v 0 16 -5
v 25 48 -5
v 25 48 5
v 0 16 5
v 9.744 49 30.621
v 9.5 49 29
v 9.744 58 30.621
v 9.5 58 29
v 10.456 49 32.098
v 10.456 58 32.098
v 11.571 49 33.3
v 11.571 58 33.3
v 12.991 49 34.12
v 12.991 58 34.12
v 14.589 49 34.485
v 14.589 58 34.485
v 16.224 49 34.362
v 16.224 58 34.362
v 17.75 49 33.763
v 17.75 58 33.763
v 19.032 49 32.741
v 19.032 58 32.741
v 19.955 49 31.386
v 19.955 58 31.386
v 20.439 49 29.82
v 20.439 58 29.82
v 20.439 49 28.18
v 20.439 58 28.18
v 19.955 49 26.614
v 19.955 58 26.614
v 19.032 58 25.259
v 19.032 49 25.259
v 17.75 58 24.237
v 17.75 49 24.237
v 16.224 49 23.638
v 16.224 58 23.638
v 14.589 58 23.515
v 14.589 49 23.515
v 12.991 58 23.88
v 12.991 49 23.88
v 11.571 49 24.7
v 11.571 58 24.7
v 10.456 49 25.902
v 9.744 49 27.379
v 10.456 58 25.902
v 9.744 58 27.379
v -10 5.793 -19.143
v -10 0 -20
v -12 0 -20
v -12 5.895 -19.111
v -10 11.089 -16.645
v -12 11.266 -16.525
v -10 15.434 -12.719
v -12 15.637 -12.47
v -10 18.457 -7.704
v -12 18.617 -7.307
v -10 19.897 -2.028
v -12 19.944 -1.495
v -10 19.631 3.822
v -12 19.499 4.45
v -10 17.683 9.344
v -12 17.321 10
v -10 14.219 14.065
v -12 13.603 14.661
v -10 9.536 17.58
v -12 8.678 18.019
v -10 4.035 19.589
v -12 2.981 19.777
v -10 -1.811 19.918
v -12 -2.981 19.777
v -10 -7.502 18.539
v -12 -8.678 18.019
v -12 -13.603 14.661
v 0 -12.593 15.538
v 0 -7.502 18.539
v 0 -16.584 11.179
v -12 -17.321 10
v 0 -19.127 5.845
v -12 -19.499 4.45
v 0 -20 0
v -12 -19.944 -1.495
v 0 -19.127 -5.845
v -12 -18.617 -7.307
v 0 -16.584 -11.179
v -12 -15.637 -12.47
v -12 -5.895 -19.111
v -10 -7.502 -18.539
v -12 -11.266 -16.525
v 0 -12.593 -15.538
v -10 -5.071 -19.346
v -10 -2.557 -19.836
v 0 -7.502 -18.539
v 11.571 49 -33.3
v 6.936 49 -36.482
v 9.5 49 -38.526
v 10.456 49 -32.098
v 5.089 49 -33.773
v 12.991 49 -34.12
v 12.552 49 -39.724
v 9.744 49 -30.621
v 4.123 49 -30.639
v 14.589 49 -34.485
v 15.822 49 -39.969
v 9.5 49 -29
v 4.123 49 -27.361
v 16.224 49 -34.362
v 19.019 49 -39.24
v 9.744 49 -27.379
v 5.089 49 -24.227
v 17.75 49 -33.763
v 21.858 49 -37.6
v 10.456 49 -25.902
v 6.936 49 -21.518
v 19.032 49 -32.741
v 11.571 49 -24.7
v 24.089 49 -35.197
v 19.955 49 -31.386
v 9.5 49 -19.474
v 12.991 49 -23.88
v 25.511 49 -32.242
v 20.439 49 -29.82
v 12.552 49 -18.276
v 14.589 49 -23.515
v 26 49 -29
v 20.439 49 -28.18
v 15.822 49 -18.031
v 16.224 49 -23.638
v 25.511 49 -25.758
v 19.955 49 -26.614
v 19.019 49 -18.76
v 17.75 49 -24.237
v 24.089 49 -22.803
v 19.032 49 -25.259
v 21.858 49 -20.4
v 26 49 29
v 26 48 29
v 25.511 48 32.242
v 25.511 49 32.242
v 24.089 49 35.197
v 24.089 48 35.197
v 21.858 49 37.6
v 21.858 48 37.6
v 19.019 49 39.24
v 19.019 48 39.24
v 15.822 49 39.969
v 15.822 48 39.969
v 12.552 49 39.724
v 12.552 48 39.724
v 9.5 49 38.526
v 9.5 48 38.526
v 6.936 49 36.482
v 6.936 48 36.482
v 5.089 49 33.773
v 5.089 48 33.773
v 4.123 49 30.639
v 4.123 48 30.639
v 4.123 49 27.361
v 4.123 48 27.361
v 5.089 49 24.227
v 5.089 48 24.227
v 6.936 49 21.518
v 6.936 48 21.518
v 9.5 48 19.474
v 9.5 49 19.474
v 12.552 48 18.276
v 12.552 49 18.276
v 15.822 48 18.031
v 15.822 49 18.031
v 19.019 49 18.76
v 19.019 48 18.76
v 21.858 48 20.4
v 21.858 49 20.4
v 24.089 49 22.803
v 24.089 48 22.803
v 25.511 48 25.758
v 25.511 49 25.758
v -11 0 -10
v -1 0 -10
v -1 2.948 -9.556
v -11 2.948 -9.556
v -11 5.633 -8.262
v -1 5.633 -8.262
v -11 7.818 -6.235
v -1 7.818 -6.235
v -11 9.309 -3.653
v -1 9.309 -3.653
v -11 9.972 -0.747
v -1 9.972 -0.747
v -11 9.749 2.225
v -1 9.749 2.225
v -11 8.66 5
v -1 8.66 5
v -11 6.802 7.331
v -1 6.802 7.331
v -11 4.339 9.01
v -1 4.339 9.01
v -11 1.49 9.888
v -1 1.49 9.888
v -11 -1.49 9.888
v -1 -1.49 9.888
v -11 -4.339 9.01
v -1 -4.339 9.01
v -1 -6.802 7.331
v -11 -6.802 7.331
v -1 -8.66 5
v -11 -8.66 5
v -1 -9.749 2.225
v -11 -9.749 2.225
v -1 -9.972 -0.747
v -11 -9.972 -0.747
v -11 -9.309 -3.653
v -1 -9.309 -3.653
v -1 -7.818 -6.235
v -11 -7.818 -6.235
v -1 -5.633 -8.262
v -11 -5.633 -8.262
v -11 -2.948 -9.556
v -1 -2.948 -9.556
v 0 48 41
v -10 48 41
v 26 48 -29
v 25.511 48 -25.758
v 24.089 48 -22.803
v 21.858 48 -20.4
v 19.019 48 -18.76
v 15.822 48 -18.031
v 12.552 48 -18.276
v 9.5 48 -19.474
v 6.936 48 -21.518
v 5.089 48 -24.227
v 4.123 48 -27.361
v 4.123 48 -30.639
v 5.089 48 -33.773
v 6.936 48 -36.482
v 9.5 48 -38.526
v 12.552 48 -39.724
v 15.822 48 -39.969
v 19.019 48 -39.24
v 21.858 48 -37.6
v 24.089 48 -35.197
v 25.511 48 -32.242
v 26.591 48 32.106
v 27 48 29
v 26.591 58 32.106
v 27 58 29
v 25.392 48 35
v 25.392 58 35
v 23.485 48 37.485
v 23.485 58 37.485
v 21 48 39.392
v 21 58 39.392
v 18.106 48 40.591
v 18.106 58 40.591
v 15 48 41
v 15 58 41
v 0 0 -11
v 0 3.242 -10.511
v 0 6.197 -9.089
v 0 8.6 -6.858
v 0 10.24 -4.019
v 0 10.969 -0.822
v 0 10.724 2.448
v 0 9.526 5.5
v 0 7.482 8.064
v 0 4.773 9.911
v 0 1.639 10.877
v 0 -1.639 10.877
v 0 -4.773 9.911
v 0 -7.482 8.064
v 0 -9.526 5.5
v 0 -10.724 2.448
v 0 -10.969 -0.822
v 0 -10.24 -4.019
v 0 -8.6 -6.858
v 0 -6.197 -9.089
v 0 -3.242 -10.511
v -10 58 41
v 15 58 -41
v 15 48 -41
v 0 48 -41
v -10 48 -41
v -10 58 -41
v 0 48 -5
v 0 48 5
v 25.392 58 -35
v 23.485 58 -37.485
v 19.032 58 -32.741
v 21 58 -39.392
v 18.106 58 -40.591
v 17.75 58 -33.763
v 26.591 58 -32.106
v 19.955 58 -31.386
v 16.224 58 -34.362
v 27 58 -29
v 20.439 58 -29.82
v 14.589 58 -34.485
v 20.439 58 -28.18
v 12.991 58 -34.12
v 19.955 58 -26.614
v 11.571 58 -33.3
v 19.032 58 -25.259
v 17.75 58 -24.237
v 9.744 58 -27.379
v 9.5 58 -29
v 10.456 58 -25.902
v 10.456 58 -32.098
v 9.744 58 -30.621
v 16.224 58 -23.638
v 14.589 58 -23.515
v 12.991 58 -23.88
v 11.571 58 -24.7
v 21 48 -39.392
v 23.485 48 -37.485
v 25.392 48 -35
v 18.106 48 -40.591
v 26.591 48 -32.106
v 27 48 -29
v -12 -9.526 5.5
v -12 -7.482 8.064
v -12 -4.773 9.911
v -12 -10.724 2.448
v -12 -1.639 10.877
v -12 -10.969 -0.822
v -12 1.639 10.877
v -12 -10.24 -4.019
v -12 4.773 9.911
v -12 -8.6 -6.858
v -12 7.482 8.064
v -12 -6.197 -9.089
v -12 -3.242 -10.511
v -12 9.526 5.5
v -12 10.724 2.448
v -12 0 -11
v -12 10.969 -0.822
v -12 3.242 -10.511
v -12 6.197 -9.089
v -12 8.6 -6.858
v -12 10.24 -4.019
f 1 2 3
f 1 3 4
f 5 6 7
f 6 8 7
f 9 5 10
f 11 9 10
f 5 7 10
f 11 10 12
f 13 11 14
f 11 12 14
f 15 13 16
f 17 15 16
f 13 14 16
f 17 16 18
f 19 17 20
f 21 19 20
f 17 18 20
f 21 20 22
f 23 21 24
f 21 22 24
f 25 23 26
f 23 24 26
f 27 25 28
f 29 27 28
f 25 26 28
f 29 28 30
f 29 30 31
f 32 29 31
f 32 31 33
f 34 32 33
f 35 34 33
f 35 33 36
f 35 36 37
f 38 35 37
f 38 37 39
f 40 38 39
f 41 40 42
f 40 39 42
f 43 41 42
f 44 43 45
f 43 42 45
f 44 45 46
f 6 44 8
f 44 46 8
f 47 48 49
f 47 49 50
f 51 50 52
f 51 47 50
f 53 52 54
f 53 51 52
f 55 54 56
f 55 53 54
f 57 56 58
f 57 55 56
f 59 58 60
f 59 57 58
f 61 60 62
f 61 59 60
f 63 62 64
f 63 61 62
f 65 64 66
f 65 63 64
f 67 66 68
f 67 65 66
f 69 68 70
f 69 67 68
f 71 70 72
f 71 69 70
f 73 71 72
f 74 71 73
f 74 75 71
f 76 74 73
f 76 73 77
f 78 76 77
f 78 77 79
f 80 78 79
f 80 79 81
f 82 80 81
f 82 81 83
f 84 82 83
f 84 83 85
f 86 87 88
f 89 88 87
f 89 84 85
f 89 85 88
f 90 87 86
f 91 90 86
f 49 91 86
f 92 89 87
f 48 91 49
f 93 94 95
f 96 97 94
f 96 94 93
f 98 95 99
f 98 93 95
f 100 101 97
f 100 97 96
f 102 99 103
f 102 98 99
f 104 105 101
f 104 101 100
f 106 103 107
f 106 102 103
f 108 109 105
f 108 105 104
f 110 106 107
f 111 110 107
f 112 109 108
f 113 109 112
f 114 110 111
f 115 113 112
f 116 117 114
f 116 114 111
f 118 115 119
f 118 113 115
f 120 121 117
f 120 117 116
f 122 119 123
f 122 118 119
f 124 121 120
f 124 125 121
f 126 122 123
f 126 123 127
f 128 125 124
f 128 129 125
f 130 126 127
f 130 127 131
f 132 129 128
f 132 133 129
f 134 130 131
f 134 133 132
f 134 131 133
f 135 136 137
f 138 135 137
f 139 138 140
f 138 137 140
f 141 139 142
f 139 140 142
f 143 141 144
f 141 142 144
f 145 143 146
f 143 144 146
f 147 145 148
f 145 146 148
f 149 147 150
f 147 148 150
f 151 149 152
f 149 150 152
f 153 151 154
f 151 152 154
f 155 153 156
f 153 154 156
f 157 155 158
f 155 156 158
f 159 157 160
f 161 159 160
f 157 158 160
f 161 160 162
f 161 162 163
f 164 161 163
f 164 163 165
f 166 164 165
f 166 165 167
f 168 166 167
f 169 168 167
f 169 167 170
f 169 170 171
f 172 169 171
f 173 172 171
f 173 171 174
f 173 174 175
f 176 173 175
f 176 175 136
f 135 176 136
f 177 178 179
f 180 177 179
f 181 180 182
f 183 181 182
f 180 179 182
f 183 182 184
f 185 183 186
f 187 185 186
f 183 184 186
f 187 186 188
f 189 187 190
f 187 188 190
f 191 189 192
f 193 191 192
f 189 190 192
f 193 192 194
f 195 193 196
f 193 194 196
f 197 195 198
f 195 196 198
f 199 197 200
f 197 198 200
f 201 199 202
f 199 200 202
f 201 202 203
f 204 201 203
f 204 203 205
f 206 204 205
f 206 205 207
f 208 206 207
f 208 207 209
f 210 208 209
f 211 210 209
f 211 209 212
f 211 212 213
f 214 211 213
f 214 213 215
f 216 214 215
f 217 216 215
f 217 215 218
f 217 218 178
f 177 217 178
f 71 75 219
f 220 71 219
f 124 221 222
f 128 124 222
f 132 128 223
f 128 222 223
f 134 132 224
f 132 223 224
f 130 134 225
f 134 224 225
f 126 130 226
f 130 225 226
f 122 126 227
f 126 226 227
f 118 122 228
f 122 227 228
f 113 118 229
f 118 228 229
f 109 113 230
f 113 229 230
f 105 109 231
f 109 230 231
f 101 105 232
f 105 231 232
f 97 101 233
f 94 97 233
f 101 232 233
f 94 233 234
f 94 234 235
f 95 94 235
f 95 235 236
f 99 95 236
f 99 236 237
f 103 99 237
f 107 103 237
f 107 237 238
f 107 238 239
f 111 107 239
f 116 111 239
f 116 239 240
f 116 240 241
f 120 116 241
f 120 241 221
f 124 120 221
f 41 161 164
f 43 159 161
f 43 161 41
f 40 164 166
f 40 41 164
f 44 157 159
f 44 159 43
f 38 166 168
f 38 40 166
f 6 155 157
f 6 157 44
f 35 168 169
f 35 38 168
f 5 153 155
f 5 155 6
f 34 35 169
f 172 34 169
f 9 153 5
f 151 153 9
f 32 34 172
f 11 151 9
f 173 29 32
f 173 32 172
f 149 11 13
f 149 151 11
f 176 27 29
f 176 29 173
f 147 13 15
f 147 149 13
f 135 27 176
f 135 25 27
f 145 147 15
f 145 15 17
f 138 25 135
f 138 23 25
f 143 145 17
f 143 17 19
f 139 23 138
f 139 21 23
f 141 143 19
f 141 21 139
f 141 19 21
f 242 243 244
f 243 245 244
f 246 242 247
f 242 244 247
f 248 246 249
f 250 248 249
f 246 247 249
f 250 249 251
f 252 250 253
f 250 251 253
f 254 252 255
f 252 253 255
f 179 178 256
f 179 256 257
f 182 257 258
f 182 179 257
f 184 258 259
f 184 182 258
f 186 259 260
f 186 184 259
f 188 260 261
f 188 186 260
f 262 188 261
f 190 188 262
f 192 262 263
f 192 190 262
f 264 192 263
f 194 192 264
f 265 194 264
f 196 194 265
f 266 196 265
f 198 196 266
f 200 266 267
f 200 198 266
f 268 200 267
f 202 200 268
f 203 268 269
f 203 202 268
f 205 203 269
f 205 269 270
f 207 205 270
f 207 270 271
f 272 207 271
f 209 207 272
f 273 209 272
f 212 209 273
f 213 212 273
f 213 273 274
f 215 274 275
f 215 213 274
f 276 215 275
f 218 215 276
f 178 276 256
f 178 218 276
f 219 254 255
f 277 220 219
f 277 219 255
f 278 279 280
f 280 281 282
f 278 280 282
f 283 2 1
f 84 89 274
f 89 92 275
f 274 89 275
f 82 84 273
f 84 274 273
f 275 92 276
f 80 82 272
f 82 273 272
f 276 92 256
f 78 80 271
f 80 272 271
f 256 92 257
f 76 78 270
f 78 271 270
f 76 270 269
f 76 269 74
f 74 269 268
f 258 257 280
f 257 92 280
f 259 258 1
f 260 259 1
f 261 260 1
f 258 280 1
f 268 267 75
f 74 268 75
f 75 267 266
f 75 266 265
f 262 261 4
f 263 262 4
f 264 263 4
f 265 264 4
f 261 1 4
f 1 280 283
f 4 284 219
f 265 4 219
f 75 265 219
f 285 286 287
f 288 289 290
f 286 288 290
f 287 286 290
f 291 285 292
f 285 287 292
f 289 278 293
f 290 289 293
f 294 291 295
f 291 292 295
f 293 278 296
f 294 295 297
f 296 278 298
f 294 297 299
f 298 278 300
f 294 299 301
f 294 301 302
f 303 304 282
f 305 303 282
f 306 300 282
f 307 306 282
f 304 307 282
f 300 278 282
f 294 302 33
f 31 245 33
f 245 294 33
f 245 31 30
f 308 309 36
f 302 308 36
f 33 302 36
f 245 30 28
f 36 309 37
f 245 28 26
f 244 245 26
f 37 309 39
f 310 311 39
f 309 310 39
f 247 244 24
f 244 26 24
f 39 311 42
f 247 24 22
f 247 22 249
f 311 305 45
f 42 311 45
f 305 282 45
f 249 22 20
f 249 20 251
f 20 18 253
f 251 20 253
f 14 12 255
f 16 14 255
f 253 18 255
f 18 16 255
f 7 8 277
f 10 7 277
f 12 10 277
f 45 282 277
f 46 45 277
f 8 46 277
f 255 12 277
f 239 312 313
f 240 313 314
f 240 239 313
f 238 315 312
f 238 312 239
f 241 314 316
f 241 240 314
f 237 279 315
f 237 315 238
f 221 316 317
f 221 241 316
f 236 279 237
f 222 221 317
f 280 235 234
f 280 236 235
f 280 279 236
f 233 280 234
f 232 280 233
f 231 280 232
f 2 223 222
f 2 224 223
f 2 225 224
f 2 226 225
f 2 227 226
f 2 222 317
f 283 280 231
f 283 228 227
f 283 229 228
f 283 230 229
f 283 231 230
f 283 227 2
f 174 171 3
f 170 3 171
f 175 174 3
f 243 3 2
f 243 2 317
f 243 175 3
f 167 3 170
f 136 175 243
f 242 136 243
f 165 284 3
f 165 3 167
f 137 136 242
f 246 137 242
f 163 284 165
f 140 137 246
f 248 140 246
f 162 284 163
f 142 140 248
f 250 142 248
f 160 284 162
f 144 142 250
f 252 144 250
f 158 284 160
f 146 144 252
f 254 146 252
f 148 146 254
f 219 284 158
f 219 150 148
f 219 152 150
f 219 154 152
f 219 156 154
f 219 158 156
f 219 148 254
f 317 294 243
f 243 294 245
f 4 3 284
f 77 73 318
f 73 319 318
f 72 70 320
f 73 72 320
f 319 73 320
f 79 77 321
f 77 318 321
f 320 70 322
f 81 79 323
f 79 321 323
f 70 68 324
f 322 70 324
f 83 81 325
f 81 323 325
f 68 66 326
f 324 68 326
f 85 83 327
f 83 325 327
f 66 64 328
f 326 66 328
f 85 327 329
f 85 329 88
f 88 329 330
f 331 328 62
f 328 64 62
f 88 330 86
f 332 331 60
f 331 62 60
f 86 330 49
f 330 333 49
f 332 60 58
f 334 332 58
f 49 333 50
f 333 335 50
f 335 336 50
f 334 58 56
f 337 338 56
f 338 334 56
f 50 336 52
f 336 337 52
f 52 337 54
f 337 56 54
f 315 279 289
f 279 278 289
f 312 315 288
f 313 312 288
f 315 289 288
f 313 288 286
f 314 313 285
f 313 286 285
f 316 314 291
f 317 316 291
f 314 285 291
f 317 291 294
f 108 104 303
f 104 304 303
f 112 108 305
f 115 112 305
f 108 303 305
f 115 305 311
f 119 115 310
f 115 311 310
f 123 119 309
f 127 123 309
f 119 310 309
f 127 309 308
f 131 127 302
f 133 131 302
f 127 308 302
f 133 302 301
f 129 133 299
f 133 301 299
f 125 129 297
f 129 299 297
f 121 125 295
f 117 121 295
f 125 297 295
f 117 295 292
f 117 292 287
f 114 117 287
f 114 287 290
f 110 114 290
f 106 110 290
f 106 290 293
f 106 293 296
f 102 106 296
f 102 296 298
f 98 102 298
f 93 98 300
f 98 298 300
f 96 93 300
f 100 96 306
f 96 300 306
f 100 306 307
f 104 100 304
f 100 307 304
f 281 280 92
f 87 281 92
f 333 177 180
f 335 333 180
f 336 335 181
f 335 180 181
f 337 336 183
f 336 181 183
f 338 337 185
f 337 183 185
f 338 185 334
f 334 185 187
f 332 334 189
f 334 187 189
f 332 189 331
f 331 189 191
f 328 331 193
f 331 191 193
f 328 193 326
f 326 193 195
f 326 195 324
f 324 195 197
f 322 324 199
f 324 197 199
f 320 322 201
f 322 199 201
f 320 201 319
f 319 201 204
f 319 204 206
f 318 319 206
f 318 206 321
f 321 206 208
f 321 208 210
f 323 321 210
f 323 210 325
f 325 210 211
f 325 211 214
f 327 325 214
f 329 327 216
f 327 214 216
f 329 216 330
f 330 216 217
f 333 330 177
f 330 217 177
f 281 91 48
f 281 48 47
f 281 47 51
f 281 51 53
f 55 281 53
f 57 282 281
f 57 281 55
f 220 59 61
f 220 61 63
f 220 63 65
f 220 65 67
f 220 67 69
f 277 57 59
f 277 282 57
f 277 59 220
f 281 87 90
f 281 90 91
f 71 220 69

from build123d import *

# Parameters (mm, degrees)
EXTRUSION1_DEPTH                                = 10
ESQUISSE2_R                                     = 20
EXTRUSION2_DEPTH                                = 12
ESQUISSE3_W                                     = 82
ESQUISSE3_H                                     = 10
EXTRUSION3_DEPTH                                = 37
CONG_1_R                                        = 12
CHAMBRAGE_POUR_VIS_T_TE_CYLINDRIQUE_D           = 11
CHAMBRAGE_POUR_VIS_T_TE_CYLINDRIQUE_CBORE_D     = 22
CHAMBRAGE_POUR_VIS_T_TE_CYLINDRIQUE_CBORE_DEPTH = 1
D_GAGEMENT_M1_61_D                              = 20
NERVURE1_REACH                                  = 77.987
ESQUISSE9_WALL_W                                = 194.58156294
ESQUISSE9_WALL_H                                = 10
CHANFREIN1_SIZE                                 = 1


with BuildPart() as part:
    # Esquisse1 → Extrusion1 (new body)
    with BuildSketch(Plane(origin=(0, 0, 0), x_dir=(0, 0, -1), z_dir=(1, 0, 0))):
        with BuildLine():
            Line((-41, 58), (41, 58))
            Line((41, 58), (41, 48))
            Line((41, 48), (18.539491779, -7.502482561))
            ThreePointArc((18.539491779, -7.502482561), (0, -20), (-18.539491779, -7.502482561))
            Line((-18.539491779, -7.502482561), (-41, 48))
            Line((-41, 48), (-41, 58))
        make_face()
    extrude(amount=-EXTRUSION1_DEPTH)

    # Esquisse2 → Extrusion2 (add)
    with BuildSketch(Plane(origin=(0, 0, 0), x_dir=(0, 0, -1), z_dir=(1, 0, 0))):
        Circle(ESQUISSE2_R)
    extrude(amount=-EXTRUSION2_DEPTH)

    # Esquisse3 → Extrusion3 (add)
    with BuildSketch(Plane.ZY.offset(10)):
        with Locations((0, 53)):
            Rectangle(ESQUISSE3_W, ESQUISSE3_H)
    extrude(amount=-EXTRUSION3_DEPTH)

    # Congé1
    cong_1_edges = [part.edges().sort_by_distance(p)[0] for p in [
        (27, 53, -41),
        (27, 53, 41),
    ]]
    fillet(cong_1_edges, radius=CONG_1_R)

    # Chambrage pour vis à tête cylindrique à 6 pans creux (ou vis CHC) M41 (through all)
    with Locations(Plane.XZ.offset(-48)):
        with Locations((15, 29), (15, -29)):
            CounterBoreHole(CHAMBRAGE_POUR_VIS_T_TE_CYLINDRIQUE_D / 2, CHAMBRAGE_POUR_VIS_T_TE_CYLINDRIQUE_CBORE_D / 2, CHAMBRAGE_POUR_VIS_T_TE_CYLINDRIQUE_CBORE_DEPTH)

    # Dégagement M1.61 (through all)
    with Locations(Plane.ZY.offset(12)):
        with Locations((0, 0)):
            Hole(D_GAGEMENT_M1_61_D / 2)

    # Esquisse9 wall → Nervure1 (add, up to next)
    with BuildSketch(Plane(origin=(12.5, 32, 0), x_dir=(-0.615644041972, -0.788024373725, 0), z_dir=(0.788024373725, -0.615644041972, 0)), mode=Mode.PRIVATE) as nervure1_sk1:
        Rectangle(ESQUISSE9_WALL_W, ESQUISSE9_WALL_H)
    nervure1_tool1 = extrude(nervure1_sk1.sketch, amount=-NERVURE1_REACH, mode=Mode.PRIVATE) - part.part
    add(nervure1_tool1.solids().sort_by_distance((12.5, 32, 0))[0])

    # Chanfrein1
    chanfrein1_edges = [part.edges().sort_by_distance(p)[0] for p in [
        (0, 0, 10),
        (-12, 0, 10),
    ]]
    chamfer(chanfrein1_edges, length=CHANFREIN1_SIZE)


solid = part.part
